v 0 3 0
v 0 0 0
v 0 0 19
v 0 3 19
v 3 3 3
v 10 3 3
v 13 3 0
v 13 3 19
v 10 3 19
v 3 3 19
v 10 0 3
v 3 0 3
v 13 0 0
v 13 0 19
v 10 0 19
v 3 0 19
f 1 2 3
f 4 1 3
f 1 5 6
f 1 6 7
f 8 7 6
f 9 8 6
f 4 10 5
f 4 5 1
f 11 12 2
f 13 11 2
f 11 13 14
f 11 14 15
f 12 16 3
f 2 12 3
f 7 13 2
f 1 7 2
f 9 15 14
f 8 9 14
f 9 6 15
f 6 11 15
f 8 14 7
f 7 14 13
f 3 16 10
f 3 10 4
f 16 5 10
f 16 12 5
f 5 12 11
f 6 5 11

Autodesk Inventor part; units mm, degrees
ref_plane "YZ Plane" through (0, 0, 0) normal (1, 0, 0) x (0, 1, 0)
ref_plane "XZ Plane" through (0, 0, 0) normal (0, 1, 0) x (-1, 0, 0)
ref_plane "XY Plane" through (0, 0, 0) normal (0, 0, 1) x (1, 0, 0)
sketch "Sketch1" plane through (0, 0, 0) normal (0, 1, 0) x (-1, 0, 0)
  line L0 (-13, 0) -> (0, 0)
  line L1 (0, 0) -> (0, 3)
  line L2 (0, 3) -> (-13, 3)
  line L3 (-13, 3) -> (-13, 0)
  line L4 (-13, 3) -> (-10, 3)
  line L5 (-10, 3) -> (-10, 19)
  line L6 (-10, 19) -> (-13, 19)
  line L7 (-13, 19) -> (-13, 3)
  line L8 (0, 3) -> (-3, 3)
  line L9 (-3, 3) -> (-3, 19)
  line L10 (-3, 19) -> (0, 19)
  line L11 (0, 19) -> (0, 3)
  point P0 (0, 0)
  dimension "d0" = 13
  dimension "d1" = 3
  dimension "d2" = 3
  dimension "d3" = 16
  dimension "d4" = 3
  dimension "d5" = 16
extrude "Extrusion1" add sketch "Sketch1" along normal blind 3
